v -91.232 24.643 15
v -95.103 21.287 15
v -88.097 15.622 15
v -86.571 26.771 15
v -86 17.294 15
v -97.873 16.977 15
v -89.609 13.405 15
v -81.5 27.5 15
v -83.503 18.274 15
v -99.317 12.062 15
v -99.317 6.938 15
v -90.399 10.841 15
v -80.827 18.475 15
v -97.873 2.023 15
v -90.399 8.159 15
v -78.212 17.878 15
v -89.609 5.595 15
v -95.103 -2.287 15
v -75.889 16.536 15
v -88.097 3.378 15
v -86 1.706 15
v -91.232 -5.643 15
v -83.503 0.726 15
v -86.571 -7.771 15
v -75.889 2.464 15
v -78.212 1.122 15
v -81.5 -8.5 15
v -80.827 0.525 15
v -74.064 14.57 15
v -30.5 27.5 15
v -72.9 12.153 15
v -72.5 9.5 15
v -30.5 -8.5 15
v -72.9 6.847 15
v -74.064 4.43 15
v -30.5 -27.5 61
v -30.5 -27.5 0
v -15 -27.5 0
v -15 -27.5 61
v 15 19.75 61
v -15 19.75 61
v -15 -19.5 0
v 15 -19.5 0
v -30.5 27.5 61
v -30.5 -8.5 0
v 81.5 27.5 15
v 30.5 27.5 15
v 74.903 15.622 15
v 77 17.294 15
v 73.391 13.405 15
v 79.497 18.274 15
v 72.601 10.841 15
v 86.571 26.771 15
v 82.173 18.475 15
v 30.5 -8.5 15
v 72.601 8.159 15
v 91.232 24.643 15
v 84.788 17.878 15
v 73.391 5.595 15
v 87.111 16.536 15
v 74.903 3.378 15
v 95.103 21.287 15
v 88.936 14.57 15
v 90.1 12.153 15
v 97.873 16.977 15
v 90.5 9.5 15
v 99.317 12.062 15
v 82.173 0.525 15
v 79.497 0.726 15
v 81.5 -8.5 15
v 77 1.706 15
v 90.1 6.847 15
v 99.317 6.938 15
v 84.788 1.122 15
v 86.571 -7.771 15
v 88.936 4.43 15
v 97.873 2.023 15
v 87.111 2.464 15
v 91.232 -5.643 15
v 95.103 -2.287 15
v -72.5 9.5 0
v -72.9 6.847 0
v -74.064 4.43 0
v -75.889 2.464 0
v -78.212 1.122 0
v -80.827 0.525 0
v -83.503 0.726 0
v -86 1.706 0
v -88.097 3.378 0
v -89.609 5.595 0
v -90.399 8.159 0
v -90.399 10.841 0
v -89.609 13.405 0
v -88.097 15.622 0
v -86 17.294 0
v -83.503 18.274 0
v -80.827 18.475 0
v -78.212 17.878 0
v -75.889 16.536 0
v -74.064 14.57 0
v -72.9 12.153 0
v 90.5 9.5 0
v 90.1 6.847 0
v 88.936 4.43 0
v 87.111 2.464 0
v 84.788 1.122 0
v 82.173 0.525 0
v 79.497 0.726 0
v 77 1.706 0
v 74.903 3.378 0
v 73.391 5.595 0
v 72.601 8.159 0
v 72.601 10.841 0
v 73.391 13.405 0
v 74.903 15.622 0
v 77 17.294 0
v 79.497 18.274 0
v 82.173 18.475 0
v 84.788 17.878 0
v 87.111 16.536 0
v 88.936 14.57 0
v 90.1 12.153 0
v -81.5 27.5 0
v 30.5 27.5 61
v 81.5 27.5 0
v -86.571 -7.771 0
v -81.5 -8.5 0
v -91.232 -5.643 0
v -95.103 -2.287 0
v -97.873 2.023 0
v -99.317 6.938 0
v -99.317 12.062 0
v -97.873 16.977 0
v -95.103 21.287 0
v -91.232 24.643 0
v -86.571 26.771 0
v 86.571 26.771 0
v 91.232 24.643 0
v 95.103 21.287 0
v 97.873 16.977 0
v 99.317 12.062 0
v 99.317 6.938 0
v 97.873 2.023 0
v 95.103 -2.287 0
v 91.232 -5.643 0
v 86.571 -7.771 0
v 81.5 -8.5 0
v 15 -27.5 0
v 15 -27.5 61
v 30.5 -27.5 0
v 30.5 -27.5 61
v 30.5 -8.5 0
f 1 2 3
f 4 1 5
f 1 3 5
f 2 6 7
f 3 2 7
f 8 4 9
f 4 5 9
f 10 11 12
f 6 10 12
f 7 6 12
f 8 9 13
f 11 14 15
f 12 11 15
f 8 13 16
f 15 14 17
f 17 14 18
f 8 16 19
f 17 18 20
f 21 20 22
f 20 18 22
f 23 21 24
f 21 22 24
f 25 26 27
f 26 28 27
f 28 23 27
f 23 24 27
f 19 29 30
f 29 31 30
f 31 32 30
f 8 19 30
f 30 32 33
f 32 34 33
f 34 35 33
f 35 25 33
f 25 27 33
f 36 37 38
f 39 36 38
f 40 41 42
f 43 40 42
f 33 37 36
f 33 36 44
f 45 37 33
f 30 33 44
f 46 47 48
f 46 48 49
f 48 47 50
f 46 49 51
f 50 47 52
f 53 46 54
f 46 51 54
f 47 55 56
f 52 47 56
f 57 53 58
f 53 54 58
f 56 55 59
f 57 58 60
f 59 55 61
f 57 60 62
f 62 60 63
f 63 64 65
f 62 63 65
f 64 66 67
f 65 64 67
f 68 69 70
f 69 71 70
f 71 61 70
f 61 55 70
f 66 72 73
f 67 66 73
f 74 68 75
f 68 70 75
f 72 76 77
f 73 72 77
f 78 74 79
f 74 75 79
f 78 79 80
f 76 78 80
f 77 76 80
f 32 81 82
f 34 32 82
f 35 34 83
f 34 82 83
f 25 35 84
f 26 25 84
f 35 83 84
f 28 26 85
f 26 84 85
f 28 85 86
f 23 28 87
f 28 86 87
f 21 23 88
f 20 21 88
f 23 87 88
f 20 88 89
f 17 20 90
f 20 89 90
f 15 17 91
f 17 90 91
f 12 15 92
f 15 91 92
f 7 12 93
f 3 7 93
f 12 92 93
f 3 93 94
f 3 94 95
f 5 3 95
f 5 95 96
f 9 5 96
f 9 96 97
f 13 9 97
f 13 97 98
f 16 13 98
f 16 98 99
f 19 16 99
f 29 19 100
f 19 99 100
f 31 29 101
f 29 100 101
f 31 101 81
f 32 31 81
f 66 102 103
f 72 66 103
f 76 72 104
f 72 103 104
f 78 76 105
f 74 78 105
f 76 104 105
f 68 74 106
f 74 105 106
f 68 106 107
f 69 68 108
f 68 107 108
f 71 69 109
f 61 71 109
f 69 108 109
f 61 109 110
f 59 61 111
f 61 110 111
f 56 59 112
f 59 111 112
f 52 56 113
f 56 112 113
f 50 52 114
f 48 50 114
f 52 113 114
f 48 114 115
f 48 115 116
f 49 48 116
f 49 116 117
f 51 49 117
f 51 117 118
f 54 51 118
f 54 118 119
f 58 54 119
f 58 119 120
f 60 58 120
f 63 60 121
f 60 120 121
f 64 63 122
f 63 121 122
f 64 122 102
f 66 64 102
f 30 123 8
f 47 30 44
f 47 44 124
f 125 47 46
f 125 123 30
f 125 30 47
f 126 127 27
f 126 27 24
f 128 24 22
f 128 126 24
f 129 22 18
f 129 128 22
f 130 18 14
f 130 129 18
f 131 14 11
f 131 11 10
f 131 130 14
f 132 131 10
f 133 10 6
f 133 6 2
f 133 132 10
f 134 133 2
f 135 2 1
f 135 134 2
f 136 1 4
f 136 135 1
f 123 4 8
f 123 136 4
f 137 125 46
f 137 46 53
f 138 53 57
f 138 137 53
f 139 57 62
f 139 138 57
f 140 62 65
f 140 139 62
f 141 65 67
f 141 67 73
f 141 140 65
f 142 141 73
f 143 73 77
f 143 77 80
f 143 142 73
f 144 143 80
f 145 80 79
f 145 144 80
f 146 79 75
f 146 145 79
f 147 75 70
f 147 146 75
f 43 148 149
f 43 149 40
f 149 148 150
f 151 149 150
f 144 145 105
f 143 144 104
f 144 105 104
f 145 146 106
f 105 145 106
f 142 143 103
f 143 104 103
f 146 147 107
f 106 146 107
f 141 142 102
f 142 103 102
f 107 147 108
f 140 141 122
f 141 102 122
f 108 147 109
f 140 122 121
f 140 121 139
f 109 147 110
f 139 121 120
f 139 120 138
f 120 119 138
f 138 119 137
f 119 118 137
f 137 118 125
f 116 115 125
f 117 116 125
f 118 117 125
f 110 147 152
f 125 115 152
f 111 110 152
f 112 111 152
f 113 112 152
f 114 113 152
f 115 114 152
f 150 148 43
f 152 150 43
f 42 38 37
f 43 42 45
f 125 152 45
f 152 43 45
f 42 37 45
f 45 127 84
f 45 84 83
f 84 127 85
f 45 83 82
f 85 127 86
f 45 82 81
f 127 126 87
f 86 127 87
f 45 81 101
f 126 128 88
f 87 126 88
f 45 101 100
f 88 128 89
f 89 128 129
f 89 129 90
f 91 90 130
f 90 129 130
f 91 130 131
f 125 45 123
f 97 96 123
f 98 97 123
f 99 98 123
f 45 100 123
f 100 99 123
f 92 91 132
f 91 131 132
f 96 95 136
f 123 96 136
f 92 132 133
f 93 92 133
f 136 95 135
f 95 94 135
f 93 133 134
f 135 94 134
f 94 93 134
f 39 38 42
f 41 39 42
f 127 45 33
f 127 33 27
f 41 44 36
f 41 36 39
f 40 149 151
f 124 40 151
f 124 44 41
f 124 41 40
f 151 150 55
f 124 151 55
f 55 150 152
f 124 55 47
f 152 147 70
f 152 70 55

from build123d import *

# Parameters (mm, degrees)
F0_W     = 61
F0_H     = 55
F1_DEPTH = 61
F2_W     = 30
F2_H     = 47.25
F3_DEPTH = 61
F4_R     = 9
F5_DEPTH = 15
F7_DEPTH = 30


with BuildPart() as f1:
    # F0 (on Top) → F1 (new body)
    with BuildSketch(Plane.XY):
        Rectangle(F0_W, F0_H)
    extrude(amount=F1_DEPTH)

    # F2 (on face) → F3 (cut)
    with BuildSketch(Plane.XY.offset(61)):
        with Locations((0, -3.875)):
            Rectangle(F2_W, F2_H)
    extrude(amount=-F3_DEPTH, mode=Mode.SUBTRACT)

    # F4 (on face) → F5 (join)
    with BuildSketch(Plane(origin=(0, 0, 0), x_dir=(1, 0, 0), z_dir=(0, 0, -1))):
        with BuildLine():
            Line((-81.5, -27.5), (-30.5, -27.5))
            Line((-30.5, -27.5), (-30.5, 8.5))
            Line((-30.5, 8.5), (-81.5, 8.5))
            ThreePointArc((-81.5, 8.5), (-99.5, -9.5), (-81.5, -27.5))
        make_face()
        with Locations((-81.5, -9.5)):
            Circle(F4_R, mode=Mode.SUBTRACT)
        with BuildLine():
            Line((30.5, 8.5), (30.5, -27.5))
            Line((30.5, -27.5), (81.5, -27.5))
            ThreePointArc((81.5, -27.5), (99.5, -9.5), (81.5, 8.5))
            Line((81.5, 8.5), (30.5, 8.5))
        make_face()
        with Locations((81.5, -9.5)):
            Circle(F4_R, mode=Mode.SUBTRACT)
    extrude(amount=-F5_DEPTH)

    # F6 (on face) → F7 (join)
    with BuildSketch(Plane.YZ.offset(-15)):
        Polygon((19.75, 0), (19.75, 61), (-19.5, 0), align=None)
    extrude(amount=F7_DEPTH)


solid = f1.part
